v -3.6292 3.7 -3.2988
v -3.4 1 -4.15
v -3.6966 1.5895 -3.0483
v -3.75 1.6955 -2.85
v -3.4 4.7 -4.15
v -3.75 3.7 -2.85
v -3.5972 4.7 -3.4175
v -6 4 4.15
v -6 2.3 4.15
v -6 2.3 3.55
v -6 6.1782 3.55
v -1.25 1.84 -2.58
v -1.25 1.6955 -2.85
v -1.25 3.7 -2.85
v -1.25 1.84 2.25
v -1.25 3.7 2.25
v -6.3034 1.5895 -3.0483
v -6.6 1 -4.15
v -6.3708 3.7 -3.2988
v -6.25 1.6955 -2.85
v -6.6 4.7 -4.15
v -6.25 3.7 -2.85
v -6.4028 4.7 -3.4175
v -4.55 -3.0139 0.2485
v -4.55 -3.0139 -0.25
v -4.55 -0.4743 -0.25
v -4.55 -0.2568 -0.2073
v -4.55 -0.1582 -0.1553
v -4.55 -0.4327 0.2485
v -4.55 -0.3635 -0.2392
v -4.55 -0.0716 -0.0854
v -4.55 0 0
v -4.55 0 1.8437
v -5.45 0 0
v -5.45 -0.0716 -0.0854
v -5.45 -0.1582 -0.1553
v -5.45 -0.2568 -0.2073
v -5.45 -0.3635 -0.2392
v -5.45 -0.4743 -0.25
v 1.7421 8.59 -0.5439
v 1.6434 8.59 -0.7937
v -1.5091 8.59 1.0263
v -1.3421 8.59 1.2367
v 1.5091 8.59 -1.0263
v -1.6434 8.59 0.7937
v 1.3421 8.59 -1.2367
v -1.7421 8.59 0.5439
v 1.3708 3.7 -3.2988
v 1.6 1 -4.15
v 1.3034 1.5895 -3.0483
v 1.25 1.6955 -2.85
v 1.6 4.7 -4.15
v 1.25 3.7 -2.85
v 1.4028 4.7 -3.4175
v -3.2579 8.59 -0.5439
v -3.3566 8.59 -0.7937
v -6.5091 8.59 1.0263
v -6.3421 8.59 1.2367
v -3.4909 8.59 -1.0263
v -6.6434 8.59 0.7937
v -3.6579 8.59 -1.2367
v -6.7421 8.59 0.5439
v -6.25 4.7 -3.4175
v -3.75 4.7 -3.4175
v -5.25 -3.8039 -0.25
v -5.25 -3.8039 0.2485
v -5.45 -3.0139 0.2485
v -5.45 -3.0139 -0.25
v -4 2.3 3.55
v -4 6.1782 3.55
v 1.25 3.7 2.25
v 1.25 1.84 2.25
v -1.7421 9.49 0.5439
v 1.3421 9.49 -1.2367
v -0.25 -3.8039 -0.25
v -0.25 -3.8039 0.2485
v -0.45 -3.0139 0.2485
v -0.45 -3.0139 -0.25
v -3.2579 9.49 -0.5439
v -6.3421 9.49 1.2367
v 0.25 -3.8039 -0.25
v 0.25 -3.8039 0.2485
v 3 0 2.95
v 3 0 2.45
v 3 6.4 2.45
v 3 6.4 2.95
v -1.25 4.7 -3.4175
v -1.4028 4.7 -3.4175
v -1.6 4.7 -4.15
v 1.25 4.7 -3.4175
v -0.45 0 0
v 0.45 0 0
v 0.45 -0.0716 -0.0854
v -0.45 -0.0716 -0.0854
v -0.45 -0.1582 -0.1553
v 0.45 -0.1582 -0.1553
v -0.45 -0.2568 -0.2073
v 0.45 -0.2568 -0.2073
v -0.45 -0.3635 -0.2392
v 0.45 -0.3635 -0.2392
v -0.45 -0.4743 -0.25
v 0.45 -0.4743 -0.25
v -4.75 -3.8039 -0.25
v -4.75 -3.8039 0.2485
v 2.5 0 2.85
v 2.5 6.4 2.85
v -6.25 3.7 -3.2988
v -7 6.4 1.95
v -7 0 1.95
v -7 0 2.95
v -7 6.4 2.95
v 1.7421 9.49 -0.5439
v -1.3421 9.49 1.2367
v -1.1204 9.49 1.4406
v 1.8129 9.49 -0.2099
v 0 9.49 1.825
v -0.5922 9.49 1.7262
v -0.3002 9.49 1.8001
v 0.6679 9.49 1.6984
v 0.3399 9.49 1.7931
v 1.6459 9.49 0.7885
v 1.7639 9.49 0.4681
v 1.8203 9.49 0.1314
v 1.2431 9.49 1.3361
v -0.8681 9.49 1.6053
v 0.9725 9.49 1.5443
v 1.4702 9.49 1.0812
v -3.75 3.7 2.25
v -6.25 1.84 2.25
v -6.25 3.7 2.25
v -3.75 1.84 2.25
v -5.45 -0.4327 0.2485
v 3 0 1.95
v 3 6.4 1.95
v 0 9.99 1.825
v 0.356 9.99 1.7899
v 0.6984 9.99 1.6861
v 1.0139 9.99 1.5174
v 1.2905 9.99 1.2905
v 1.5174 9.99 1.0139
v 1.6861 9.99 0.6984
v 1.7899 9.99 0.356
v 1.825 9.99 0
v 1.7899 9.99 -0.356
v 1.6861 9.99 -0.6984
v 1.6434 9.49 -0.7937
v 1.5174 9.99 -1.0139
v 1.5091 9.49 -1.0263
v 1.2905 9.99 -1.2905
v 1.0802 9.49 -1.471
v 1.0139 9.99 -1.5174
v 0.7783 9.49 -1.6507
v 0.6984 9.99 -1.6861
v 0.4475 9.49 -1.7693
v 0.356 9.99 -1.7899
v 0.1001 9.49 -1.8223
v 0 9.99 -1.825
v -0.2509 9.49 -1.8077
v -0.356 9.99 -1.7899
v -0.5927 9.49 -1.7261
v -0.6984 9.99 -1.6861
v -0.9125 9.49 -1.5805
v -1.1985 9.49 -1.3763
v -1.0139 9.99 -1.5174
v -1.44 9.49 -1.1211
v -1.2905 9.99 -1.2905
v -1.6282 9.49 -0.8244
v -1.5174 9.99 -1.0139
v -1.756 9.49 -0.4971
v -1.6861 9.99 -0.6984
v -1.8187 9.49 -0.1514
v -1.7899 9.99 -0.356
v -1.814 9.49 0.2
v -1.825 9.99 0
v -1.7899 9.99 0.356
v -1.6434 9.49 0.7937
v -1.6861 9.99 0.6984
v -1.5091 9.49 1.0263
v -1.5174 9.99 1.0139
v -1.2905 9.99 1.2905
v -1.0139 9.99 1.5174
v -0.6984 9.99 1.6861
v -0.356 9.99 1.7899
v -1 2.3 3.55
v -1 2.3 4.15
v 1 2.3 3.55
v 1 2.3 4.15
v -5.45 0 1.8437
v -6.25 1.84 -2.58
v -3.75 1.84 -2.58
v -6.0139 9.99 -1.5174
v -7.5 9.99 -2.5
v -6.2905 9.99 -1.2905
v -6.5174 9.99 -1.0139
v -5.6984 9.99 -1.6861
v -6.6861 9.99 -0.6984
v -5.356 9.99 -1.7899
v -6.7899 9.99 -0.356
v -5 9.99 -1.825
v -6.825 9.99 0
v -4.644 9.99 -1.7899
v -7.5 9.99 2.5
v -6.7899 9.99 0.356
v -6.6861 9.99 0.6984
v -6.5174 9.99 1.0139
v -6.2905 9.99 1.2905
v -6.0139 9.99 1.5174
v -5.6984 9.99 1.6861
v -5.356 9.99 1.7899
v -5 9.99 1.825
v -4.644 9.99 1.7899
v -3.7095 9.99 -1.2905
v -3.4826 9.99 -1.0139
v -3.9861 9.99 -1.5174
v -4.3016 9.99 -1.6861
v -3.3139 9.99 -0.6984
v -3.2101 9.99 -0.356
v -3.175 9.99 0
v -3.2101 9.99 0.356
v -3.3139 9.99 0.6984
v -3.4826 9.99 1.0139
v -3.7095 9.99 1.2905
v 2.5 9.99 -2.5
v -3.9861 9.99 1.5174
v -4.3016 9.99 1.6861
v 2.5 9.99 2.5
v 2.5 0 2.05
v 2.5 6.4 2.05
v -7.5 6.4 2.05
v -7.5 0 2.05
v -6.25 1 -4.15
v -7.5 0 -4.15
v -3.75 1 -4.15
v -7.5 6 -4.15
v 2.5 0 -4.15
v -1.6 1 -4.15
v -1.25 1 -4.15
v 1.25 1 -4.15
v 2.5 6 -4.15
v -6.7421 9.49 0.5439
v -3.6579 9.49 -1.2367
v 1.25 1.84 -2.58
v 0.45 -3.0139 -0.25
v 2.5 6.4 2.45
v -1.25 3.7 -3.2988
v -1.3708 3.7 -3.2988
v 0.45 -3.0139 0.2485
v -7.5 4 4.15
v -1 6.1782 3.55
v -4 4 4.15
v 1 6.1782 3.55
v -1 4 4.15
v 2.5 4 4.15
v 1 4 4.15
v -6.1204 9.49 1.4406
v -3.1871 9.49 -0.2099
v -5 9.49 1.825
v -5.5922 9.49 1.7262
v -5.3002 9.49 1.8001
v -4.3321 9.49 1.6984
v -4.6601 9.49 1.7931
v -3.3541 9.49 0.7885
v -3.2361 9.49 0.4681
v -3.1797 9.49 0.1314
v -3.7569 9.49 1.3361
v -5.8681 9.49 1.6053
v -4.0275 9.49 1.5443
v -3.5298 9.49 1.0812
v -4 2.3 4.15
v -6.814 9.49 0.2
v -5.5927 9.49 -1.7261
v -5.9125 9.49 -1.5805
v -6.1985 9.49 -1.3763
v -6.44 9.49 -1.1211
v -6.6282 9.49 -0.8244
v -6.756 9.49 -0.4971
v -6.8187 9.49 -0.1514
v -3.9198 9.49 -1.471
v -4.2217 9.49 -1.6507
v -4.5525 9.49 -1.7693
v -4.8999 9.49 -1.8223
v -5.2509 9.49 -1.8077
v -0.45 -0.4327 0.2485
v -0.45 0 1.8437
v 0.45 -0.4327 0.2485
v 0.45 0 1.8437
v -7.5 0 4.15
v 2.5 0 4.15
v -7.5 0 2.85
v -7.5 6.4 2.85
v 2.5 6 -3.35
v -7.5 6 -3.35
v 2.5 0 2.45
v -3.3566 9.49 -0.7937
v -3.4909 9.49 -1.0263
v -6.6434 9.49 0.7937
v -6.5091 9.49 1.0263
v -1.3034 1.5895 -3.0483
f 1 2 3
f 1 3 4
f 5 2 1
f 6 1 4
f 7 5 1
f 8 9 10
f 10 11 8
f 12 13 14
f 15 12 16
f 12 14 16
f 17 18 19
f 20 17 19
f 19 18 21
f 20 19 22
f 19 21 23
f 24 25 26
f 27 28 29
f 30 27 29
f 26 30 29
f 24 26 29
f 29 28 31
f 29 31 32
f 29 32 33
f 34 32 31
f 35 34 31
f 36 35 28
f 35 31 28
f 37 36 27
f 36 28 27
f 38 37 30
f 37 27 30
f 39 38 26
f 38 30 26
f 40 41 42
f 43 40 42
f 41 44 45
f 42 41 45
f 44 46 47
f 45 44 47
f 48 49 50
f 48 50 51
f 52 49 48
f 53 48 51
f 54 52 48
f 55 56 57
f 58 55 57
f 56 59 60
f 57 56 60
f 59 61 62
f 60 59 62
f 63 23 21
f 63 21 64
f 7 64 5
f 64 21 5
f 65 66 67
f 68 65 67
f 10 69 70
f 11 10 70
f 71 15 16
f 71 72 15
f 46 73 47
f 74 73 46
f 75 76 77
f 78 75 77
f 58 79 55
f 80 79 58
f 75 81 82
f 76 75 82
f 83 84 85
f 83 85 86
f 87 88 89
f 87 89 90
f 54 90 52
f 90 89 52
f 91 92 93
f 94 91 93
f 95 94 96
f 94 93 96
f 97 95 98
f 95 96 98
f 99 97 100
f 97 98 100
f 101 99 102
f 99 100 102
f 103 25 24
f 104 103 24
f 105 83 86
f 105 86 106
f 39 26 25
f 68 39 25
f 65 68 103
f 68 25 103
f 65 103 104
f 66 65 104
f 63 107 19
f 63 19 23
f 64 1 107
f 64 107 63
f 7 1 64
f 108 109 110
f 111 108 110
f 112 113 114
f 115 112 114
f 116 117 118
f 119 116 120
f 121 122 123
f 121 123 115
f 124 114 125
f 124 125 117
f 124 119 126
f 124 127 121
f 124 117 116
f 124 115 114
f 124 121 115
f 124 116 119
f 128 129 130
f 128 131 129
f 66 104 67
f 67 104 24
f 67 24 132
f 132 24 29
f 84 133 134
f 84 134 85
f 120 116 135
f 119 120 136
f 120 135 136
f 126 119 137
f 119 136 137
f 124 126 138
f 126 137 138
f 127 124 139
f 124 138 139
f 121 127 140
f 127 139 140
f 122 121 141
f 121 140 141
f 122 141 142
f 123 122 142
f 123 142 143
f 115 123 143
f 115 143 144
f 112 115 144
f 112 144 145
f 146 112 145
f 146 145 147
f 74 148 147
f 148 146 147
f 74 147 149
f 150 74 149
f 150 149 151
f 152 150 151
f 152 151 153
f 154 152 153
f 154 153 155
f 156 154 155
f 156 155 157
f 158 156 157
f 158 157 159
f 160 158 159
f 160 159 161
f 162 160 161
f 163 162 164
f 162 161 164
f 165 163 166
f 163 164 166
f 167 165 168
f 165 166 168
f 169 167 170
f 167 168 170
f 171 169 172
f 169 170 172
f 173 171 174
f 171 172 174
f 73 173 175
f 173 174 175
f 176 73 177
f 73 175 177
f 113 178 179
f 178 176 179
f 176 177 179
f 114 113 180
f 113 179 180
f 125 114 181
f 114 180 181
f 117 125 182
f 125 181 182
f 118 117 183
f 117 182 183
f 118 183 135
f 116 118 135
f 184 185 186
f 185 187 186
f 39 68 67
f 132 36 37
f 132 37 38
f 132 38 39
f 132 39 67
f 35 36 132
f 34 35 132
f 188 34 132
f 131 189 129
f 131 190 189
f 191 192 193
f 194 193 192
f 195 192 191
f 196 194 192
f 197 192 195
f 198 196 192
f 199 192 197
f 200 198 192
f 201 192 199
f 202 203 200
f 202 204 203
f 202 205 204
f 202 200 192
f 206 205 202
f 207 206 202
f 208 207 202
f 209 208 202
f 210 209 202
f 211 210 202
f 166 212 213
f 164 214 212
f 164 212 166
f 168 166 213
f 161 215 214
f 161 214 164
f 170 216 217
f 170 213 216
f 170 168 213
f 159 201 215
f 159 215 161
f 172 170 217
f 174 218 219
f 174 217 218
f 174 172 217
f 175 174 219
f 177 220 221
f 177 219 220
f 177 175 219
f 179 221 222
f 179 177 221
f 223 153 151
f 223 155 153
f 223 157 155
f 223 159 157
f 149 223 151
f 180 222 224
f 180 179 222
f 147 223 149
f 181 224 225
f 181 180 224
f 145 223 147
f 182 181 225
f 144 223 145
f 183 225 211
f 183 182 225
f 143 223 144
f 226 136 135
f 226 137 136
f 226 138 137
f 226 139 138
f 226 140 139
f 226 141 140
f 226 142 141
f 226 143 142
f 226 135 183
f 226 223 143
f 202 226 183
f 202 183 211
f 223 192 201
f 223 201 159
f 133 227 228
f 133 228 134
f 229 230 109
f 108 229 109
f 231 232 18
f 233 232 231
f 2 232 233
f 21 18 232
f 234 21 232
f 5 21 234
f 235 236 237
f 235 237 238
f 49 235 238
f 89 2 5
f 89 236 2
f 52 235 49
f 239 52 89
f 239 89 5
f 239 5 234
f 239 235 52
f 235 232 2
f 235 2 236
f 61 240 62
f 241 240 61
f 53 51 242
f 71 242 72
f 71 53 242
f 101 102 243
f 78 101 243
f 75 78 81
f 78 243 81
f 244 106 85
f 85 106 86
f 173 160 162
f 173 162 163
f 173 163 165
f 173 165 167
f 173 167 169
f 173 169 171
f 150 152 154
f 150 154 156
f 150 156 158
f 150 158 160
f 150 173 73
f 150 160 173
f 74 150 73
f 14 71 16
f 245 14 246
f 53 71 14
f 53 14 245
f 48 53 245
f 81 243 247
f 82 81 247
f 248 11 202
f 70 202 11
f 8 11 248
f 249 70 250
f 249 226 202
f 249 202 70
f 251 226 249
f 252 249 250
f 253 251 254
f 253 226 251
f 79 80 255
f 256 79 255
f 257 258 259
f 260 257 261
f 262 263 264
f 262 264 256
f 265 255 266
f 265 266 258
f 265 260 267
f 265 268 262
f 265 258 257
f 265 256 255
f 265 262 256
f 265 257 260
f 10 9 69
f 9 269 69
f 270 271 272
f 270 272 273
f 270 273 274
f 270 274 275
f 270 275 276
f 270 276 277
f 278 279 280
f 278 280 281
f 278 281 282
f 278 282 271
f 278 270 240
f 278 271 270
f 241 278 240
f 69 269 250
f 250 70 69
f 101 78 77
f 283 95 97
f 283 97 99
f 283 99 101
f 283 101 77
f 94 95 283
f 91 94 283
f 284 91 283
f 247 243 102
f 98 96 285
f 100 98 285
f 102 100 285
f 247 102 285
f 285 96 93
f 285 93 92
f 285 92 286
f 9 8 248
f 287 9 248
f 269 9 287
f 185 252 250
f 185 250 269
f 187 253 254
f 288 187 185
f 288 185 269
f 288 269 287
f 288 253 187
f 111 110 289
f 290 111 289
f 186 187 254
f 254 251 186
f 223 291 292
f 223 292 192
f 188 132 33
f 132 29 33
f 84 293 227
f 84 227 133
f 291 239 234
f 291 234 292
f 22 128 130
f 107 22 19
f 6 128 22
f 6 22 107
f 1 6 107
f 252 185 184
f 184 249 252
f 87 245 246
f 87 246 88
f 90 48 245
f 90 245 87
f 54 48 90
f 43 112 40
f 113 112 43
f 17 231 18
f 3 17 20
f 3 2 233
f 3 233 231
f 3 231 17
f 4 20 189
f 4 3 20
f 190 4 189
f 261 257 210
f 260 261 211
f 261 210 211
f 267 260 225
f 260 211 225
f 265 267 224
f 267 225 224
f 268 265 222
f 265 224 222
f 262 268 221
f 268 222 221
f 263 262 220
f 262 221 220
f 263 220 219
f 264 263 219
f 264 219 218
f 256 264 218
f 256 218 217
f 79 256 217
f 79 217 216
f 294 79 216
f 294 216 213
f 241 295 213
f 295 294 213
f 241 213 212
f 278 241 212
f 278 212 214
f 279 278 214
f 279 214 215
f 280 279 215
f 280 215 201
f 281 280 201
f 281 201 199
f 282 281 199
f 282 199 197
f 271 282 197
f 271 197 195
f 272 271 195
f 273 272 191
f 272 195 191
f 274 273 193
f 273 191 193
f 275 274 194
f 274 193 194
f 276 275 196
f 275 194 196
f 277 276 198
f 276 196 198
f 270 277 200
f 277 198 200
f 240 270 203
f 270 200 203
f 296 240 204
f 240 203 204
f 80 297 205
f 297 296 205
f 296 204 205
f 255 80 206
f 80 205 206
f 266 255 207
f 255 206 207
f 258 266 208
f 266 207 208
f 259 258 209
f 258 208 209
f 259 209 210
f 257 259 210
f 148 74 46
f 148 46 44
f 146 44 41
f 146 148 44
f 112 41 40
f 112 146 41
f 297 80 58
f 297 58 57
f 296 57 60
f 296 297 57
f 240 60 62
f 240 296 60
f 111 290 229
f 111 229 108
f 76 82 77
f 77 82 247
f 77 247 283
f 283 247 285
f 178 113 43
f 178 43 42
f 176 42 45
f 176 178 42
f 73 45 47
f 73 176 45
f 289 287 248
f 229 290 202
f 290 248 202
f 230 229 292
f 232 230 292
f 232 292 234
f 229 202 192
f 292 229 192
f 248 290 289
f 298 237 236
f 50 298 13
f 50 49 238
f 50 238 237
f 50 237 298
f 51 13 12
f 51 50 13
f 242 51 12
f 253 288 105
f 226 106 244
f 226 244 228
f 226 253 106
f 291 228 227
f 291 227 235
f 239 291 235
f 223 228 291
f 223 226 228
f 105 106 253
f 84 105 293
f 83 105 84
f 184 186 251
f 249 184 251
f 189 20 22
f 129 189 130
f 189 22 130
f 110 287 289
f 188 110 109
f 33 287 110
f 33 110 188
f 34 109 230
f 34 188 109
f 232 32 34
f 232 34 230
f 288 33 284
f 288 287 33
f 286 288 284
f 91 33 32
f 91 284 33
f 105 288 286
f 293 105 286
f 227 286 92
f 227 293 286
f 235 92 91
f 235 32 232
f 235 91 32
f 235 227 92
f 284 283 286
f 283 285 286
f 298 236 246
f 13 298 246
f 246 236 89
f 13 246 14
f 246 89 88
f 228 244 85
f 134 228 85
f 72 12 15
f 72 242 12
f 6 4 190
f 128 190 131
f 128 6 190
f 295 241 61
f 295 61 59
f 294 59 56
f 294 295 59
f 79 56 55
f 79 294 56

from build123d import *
from build123d.topology import SkipClean

# Parameters (mm, degrees)
BOSS_EXTRUDE1_DEPTH = 2.5
CUT_EXTRUDE1_DEPTH  = 1.25
CHAMFER1_SIZE       = 0.35
CHAMFER1_SIZE_2     = 1.3
CUT_EXTRUDE2_DEPTH  = 1
SKETCH5_R           = 1.825
CUT_EXTRUDE3_DEPTH  = 0.5
CUT_EXTRUDE4_DEPTH  = 0.9
BOSS_EXTRUDE3_DEPTH = 0.45
CHAMFER2_SIZE       = 0.2
CHAMFER2_SIZE2      = 0.79
MIRROR1_START       = -1.36978926
MIRROR1_OUTLINE_W   = 4
MIRROR1_OUTLINE_H   = 0.498489558
MIRROR1_DEPTH       = 0.193883275
LPATTERN1_COUNT     = 2
LPATTERN1_PITCH     = 5
BOSS_EXTRUDE2_DEPTH = 6.4
CUT_EXTRUDE5_DEPTH  = 6.4


# Read off the part's stored shape, not the designer's step: Mirror1
with BuildPart() as part:
    # Sketch2 → Boss-Extrude1 (new, symmetric)
    with BuildSketch(Plane(origin=(0, 0, 0), x_dir=(0, 0, -1), z_dir=(1, 0, 0))):
        Polygon((-4.15, 4), (-4.15, 0), (4.15, 0), (4.15, 6), (3.35, 6), (2.5, 9.99), (-2.5, 9.99), align=None)
    extrude(amount=BOSS_EXTRUDE1_DEPTH, both=True)

    # Sketch3 → Cut-Extrude1 (cut, symmetric)
    with BuildSketch(Plane(origin=(0, 0, 0), x_dir=(0, 0, -1), z_dir=(1, 0, 0))):
        Polygon((4.15, 1), (2.58, 1.84), (-2.25, 1.84), (-2.25, 3.7), (3.2988, 3.7), (3.4175, 4.7), (4.15, 4.7), align=None)
    extrude(amount=CUT_EXTRUDE1_DEPTH, both=True, mode=Mode.SUBTRACT)

    # Chamfer1
    # the kernel refuses this chamfer: 1.3, 0.35 mm, written as the material it takes off along each edge
    with BuildSketch(Plane(origin=(1.25, 4.7, -4.15), x_dir=(0.9905947308102195, 0, -0.1368286493795385), z_dir=(0, -1, 0))) as chamfer1_piece_1_section:
        Polygon((CHAMFER1_SIZE * 0.99059473081, CHAMFER1_SIZE * 0.13682864938), (-CHAMFER1_SIZE_2 * 0.13682864938, CHAMFER1_SIZE_2 * 0.99059473081), (0, 0), align=None)
    chamfer1_piece_1 = extrude(amount=7.075699234, mode=Mode.PRIVATE)
    chamfer1_piece_1 = split(chamfer1_piece_1, bisect_by=Plane(origin=(1.398374335, 1.802145787, -2.650751327), z_dir=(0, 0.8817303170442501, -0.47175380020201896)), keep=Keep.TOP, mode=Mode.PRIVATE)
    chamfer1_piece_1 = split(chamfer1_piece_1, bisect_by=Plane(origin=(1.398374335, 4.303686728, -3.370457615), z_dir=(0, -0.11787251100077023, -0.9930287363165143)), keep=Keep.TOP, mode=Mode.PRIVATE)
    add(chamfer1_piece_1, mode=Mode.SUBTRACT)
    with BuildSketch(Plane(origin=(1.25, 8.075699234, -4.15), x_dir=(0.9905947308102195, 0, -0.1368286493795385), z_dir=(0, -1, 0))) as chamfer1_piece_2_section:
        Polygon((CHAMFER1_SIZE * 0.99059473081, CHAMFER1_SIZE * 0.13682864938), (-CHAMFER1_SIZE_2 * 0.13682864938, CHAMFER1_SIZE_2 * 0.99059473081), (0, 0), align=None)
    chamfer1_piece_2 = extrude(amount=10.451398467, mode=Mode.PRIVATE)
    chamfer1_piece_2 = split(chamfer1_piece_2, bisect_by=Plane(origin=(1.281910217, 1.867643019, -2.528333882), z_dir=(0, 0.8817303170442501, -0.47175380020201896)), keep=Keep.TOP, mode=Mode.PRIVATE)
    chamfer1_piece_2 = split(chamfer1_piece_2, bisect_by=Plane(origin=(1.281910217, 3.7, -3.087047323), z_dir=(0, -1, 0)), keep=Keep.TOP, mode=Mode.PRIVATE)
    add(chamfer1_piece_2, mode=Mode.SUBTRACT)
    with BuildSketch(Plane(origin=(-1.25, 4.7, -4.15), x_dir=(-0.9905947308102195, 0, -0.1368286493795385), z_dir=(0, -1, 0))) as chamfer1_piece_3_section:
        Polygon((CHAMFER1_SIZE * 0.99059473081, -CHAMFER1_SIZE * 0.13682864938), (-CHAMFER1_SIZE_2 * 0.13682864938, -CHAMFER1_SIZE_2 * 0.99059473081), (0, 0), align=None)
    chamfer1_piece_3 = extrude(amount=7.075699234, mode=Mode.PRIVATE)
    chamfer1_piece_3 = split(chamfer1_piece_3, bisect_by=Plane(origin=(-1.398374335, 1.802145787, -2.650751327), z_dir=(0, 0.8817303170442501, -0.47175380020201896)), keep=Keep.TOP, mode=Mode.PRIVATE)
    chamfer1_piece_3 = split(chamfer1_piece_3, bisect_by=Plane(origin=(-1.398374335, 4.303686728, -3.370457615), z_dir=(0, -0.11787251100077023, -0.9930287363165143)), keep=Keep.TOP, mode=Mode.PRIVATE)
    add(chamfer1_piece_3, mode=Mode.SUBTRACT)
    with BuildSketch(Plane(origin=(-1.25, 8.075699234, -4.15), x_dir=(-0.9905947308102195, 0, -0.1368286493795385), z_dir=(0, -1, 0))) as chamfer1_piece_4_section:
        Polygon((CHAMFER1_SIZE * 0.99059473081, -CHAMFER1_SIZE * 0.13682864938), (-CHAMFER1_SIZE_2 * 0.13682864938, -CHAMFER1_SIZE_2 * 0.99059473081), (0, 0), align=None)
    chamfer1_piece_4 = extrude(amount=10.451398467, mode=Mode.PRIVATE)
    chamfer1_piece_4 = split(chamfer1_piece_4, bisect_by=Plane(origin=(-1.281910217, 1.867643019, -2.528333882), z_dir=(0, 0.8817303170442501, -0.47175380020201896)), keep=Keep.TOP, mode=Mode.PRIVATE)
    chamfer1_piece_4 = split(chamfer1_piece_4, bisect_by=Plane(origin=(-1.281910217, 3.7, -3.087047323), z_dir=(0, -1, 0)), keep=Keep.TOP, mode=Mode.PRIVATE)
    add(chamfer1_piece_4, mode=Mode.SUBTRACT)

    # Sketch4 → Cut-Extrude2 (cut, symmetric)
    with BuildSketch(Plane(origin=(0, 0, 0), x_dir=(0, 0, -1), z_dir=(1, 0, 0))):
        Polygon((-4.15, 2.3), (-3.55, 2.3), (-3.55, 6.178181818), (-4.15, 4), align=None)
    extrude(amount=CUT_EXTRUDE2_DEPTH, both=True, mode=Mode.SUBTRACT)

    # Sketch5 → Cut-Extrude3 (cut)
    with BuildSketch(Plane(origin=(0, 9.99, 0), x_dir=(1, 0, 0), z_dir=(0, 1, 0))):
        with Locations(Location((0, 0, 0), (0, 0, 270))):
            Circle(SKETCH5_R)
    extrude(amount=-CUT_EXTRUDE3_DEPTH, mode=Mode.SUBTRACT)

    # Sketch6 → Cut-Extrude4 (cut)
    with SkipClean():  # the faces are left unmerged after this step: merging them gives an invalid solid
        with BuildSketch(Plane(origin=(0, 9.49, 0), x_dir=(1, 0, 0), z_dir=(0, 1, 0))):
            with BuildLine():
                Line((-1.74206639, -0.543902284), (1.34206639, 1.236722607))
                ThreePointArc((1.34206639, 1.236722607), (1.580496362, 0.9125), (1.74206639, 0.543902284))
                Line((1.74206639, 0.543902284), (-1.34206639, -1.236722607))
                ThreePointArc((-1.34206639, -1.236722607), (-1.580496362, -0.9125), (-1.74206639, -0.543902284))
            make_face()
        extrude(amount=-CUT_EXTRUDE4_DEPTH, mode=Mode.SUBTRACT)

    # Sketch9 → Boss-Extrude3 (add, symmetric)
    with SkipClean():  # the faces are left unmerged after this step: merging them gives an invalid solid
        with BuildSketch(Plane(origin=(0, 0, 0), x_dir=(0, 0, -1), z_dir=(1, 0, 0))):
            with BuildLine():
                Line((0.25, -3.803865983), (-0.248489558, -3.803865983))
                Line((-0.248489558, -3.803865983), (-0.248489558, -0.432670696))
                Line((-0.248489558, -0.432670696), (-1.843660044, 0))
                Line((-1.843660044, 0), (0, 0))
                ThreePointArc((0, 0), (0.183674749, -0.206246517), (0.25, -0.474341649))
                Line((0.25, -0.474341649), (0.25, -3.803865983))
            make_face()
        extrude(amount=BOSS_EXTRUDE3_DEPTH, both=True)

    # Chamfer2
    chamfer2_edges = [part.edges().sort_by_distance(p)[0] for p in [
        (0.45, -3.803865983, -0.000755221),
    ]]
    chamfer2_side = [part.faces().sort_by_distance(p)[0] for p in [
        (0, -3.803865983, -0.000755221),
    ]]
    chamfer(chamfer2_edges, length=CHAMFER2_SIZE, length2=CHAMFER2_SIZE2, reference=chamfer2_side[0])

    # Mirror1 outline → Mirror1 (cut)
    with SkipClean():  # the faces are left unmerged after this step: merging them gives an invalid solid
        with BuildSketch(Plane(origin=(0, 0, 0), x_dir=(-0.2454218669703849, 0.9694163745330335, 0), z_dir=(0.9694163745330335, 0.2454218669703849, 0)).offset(MIRROR1_START)):
            with Locations((-3, -0.000755221)):
                Rectangle(MIRROR1_OUTLINE_W, MIRROR1_OUTLINE_H)
        extrude(amount=MIRROR1_DEPTH, mode=Mode.SUBTRACT)


with BuildPart() as lpattern1_1:
    # LPattern1: pattern copy
    add(part.part.moved(Location(Vector(-1, 0, 0) * (1 * LPATTERN1_PITCH))))


with BuildPart() as part_1:
    add(part.part)

    # Combine1: union LPattern1_1
    add(lpattern1_1.part)

    # Sketch8 → Boss-Extrude2 (add)
    with SkipClean():  # the faces are left unmerged after this step: merging them gives an invalid solid
        with BuildSketch(Plane.XZ):
            Polygon((3, 2.45), (2.5, 2.45), (2.5, 2.05), (3, 1.95), align=None)
            Polygon((3, 2.95), (2.5, 2.85), (2.5, 2.45), (3, 2.45), align=None)
        extrude(amount=-BOSS_EXTRUDE2_DEPTH)

    # Sketch8<3> → Cut-Extrude5 (cut)
    with SkipClean():  # the faces are left unmerged after this step: merging them gives an invalid solid
        with BuildSketch(Plane.XZ):
            Polygon((-7, 1.95), (-7, 2.95), (-7.5, 2.85), (-7.5, 2.05), align=None)
        extrude(amount=-CUT_EXTRUDE5_DEPTH, mode=Mode.SUBTRACT)


solid = part_1.part
